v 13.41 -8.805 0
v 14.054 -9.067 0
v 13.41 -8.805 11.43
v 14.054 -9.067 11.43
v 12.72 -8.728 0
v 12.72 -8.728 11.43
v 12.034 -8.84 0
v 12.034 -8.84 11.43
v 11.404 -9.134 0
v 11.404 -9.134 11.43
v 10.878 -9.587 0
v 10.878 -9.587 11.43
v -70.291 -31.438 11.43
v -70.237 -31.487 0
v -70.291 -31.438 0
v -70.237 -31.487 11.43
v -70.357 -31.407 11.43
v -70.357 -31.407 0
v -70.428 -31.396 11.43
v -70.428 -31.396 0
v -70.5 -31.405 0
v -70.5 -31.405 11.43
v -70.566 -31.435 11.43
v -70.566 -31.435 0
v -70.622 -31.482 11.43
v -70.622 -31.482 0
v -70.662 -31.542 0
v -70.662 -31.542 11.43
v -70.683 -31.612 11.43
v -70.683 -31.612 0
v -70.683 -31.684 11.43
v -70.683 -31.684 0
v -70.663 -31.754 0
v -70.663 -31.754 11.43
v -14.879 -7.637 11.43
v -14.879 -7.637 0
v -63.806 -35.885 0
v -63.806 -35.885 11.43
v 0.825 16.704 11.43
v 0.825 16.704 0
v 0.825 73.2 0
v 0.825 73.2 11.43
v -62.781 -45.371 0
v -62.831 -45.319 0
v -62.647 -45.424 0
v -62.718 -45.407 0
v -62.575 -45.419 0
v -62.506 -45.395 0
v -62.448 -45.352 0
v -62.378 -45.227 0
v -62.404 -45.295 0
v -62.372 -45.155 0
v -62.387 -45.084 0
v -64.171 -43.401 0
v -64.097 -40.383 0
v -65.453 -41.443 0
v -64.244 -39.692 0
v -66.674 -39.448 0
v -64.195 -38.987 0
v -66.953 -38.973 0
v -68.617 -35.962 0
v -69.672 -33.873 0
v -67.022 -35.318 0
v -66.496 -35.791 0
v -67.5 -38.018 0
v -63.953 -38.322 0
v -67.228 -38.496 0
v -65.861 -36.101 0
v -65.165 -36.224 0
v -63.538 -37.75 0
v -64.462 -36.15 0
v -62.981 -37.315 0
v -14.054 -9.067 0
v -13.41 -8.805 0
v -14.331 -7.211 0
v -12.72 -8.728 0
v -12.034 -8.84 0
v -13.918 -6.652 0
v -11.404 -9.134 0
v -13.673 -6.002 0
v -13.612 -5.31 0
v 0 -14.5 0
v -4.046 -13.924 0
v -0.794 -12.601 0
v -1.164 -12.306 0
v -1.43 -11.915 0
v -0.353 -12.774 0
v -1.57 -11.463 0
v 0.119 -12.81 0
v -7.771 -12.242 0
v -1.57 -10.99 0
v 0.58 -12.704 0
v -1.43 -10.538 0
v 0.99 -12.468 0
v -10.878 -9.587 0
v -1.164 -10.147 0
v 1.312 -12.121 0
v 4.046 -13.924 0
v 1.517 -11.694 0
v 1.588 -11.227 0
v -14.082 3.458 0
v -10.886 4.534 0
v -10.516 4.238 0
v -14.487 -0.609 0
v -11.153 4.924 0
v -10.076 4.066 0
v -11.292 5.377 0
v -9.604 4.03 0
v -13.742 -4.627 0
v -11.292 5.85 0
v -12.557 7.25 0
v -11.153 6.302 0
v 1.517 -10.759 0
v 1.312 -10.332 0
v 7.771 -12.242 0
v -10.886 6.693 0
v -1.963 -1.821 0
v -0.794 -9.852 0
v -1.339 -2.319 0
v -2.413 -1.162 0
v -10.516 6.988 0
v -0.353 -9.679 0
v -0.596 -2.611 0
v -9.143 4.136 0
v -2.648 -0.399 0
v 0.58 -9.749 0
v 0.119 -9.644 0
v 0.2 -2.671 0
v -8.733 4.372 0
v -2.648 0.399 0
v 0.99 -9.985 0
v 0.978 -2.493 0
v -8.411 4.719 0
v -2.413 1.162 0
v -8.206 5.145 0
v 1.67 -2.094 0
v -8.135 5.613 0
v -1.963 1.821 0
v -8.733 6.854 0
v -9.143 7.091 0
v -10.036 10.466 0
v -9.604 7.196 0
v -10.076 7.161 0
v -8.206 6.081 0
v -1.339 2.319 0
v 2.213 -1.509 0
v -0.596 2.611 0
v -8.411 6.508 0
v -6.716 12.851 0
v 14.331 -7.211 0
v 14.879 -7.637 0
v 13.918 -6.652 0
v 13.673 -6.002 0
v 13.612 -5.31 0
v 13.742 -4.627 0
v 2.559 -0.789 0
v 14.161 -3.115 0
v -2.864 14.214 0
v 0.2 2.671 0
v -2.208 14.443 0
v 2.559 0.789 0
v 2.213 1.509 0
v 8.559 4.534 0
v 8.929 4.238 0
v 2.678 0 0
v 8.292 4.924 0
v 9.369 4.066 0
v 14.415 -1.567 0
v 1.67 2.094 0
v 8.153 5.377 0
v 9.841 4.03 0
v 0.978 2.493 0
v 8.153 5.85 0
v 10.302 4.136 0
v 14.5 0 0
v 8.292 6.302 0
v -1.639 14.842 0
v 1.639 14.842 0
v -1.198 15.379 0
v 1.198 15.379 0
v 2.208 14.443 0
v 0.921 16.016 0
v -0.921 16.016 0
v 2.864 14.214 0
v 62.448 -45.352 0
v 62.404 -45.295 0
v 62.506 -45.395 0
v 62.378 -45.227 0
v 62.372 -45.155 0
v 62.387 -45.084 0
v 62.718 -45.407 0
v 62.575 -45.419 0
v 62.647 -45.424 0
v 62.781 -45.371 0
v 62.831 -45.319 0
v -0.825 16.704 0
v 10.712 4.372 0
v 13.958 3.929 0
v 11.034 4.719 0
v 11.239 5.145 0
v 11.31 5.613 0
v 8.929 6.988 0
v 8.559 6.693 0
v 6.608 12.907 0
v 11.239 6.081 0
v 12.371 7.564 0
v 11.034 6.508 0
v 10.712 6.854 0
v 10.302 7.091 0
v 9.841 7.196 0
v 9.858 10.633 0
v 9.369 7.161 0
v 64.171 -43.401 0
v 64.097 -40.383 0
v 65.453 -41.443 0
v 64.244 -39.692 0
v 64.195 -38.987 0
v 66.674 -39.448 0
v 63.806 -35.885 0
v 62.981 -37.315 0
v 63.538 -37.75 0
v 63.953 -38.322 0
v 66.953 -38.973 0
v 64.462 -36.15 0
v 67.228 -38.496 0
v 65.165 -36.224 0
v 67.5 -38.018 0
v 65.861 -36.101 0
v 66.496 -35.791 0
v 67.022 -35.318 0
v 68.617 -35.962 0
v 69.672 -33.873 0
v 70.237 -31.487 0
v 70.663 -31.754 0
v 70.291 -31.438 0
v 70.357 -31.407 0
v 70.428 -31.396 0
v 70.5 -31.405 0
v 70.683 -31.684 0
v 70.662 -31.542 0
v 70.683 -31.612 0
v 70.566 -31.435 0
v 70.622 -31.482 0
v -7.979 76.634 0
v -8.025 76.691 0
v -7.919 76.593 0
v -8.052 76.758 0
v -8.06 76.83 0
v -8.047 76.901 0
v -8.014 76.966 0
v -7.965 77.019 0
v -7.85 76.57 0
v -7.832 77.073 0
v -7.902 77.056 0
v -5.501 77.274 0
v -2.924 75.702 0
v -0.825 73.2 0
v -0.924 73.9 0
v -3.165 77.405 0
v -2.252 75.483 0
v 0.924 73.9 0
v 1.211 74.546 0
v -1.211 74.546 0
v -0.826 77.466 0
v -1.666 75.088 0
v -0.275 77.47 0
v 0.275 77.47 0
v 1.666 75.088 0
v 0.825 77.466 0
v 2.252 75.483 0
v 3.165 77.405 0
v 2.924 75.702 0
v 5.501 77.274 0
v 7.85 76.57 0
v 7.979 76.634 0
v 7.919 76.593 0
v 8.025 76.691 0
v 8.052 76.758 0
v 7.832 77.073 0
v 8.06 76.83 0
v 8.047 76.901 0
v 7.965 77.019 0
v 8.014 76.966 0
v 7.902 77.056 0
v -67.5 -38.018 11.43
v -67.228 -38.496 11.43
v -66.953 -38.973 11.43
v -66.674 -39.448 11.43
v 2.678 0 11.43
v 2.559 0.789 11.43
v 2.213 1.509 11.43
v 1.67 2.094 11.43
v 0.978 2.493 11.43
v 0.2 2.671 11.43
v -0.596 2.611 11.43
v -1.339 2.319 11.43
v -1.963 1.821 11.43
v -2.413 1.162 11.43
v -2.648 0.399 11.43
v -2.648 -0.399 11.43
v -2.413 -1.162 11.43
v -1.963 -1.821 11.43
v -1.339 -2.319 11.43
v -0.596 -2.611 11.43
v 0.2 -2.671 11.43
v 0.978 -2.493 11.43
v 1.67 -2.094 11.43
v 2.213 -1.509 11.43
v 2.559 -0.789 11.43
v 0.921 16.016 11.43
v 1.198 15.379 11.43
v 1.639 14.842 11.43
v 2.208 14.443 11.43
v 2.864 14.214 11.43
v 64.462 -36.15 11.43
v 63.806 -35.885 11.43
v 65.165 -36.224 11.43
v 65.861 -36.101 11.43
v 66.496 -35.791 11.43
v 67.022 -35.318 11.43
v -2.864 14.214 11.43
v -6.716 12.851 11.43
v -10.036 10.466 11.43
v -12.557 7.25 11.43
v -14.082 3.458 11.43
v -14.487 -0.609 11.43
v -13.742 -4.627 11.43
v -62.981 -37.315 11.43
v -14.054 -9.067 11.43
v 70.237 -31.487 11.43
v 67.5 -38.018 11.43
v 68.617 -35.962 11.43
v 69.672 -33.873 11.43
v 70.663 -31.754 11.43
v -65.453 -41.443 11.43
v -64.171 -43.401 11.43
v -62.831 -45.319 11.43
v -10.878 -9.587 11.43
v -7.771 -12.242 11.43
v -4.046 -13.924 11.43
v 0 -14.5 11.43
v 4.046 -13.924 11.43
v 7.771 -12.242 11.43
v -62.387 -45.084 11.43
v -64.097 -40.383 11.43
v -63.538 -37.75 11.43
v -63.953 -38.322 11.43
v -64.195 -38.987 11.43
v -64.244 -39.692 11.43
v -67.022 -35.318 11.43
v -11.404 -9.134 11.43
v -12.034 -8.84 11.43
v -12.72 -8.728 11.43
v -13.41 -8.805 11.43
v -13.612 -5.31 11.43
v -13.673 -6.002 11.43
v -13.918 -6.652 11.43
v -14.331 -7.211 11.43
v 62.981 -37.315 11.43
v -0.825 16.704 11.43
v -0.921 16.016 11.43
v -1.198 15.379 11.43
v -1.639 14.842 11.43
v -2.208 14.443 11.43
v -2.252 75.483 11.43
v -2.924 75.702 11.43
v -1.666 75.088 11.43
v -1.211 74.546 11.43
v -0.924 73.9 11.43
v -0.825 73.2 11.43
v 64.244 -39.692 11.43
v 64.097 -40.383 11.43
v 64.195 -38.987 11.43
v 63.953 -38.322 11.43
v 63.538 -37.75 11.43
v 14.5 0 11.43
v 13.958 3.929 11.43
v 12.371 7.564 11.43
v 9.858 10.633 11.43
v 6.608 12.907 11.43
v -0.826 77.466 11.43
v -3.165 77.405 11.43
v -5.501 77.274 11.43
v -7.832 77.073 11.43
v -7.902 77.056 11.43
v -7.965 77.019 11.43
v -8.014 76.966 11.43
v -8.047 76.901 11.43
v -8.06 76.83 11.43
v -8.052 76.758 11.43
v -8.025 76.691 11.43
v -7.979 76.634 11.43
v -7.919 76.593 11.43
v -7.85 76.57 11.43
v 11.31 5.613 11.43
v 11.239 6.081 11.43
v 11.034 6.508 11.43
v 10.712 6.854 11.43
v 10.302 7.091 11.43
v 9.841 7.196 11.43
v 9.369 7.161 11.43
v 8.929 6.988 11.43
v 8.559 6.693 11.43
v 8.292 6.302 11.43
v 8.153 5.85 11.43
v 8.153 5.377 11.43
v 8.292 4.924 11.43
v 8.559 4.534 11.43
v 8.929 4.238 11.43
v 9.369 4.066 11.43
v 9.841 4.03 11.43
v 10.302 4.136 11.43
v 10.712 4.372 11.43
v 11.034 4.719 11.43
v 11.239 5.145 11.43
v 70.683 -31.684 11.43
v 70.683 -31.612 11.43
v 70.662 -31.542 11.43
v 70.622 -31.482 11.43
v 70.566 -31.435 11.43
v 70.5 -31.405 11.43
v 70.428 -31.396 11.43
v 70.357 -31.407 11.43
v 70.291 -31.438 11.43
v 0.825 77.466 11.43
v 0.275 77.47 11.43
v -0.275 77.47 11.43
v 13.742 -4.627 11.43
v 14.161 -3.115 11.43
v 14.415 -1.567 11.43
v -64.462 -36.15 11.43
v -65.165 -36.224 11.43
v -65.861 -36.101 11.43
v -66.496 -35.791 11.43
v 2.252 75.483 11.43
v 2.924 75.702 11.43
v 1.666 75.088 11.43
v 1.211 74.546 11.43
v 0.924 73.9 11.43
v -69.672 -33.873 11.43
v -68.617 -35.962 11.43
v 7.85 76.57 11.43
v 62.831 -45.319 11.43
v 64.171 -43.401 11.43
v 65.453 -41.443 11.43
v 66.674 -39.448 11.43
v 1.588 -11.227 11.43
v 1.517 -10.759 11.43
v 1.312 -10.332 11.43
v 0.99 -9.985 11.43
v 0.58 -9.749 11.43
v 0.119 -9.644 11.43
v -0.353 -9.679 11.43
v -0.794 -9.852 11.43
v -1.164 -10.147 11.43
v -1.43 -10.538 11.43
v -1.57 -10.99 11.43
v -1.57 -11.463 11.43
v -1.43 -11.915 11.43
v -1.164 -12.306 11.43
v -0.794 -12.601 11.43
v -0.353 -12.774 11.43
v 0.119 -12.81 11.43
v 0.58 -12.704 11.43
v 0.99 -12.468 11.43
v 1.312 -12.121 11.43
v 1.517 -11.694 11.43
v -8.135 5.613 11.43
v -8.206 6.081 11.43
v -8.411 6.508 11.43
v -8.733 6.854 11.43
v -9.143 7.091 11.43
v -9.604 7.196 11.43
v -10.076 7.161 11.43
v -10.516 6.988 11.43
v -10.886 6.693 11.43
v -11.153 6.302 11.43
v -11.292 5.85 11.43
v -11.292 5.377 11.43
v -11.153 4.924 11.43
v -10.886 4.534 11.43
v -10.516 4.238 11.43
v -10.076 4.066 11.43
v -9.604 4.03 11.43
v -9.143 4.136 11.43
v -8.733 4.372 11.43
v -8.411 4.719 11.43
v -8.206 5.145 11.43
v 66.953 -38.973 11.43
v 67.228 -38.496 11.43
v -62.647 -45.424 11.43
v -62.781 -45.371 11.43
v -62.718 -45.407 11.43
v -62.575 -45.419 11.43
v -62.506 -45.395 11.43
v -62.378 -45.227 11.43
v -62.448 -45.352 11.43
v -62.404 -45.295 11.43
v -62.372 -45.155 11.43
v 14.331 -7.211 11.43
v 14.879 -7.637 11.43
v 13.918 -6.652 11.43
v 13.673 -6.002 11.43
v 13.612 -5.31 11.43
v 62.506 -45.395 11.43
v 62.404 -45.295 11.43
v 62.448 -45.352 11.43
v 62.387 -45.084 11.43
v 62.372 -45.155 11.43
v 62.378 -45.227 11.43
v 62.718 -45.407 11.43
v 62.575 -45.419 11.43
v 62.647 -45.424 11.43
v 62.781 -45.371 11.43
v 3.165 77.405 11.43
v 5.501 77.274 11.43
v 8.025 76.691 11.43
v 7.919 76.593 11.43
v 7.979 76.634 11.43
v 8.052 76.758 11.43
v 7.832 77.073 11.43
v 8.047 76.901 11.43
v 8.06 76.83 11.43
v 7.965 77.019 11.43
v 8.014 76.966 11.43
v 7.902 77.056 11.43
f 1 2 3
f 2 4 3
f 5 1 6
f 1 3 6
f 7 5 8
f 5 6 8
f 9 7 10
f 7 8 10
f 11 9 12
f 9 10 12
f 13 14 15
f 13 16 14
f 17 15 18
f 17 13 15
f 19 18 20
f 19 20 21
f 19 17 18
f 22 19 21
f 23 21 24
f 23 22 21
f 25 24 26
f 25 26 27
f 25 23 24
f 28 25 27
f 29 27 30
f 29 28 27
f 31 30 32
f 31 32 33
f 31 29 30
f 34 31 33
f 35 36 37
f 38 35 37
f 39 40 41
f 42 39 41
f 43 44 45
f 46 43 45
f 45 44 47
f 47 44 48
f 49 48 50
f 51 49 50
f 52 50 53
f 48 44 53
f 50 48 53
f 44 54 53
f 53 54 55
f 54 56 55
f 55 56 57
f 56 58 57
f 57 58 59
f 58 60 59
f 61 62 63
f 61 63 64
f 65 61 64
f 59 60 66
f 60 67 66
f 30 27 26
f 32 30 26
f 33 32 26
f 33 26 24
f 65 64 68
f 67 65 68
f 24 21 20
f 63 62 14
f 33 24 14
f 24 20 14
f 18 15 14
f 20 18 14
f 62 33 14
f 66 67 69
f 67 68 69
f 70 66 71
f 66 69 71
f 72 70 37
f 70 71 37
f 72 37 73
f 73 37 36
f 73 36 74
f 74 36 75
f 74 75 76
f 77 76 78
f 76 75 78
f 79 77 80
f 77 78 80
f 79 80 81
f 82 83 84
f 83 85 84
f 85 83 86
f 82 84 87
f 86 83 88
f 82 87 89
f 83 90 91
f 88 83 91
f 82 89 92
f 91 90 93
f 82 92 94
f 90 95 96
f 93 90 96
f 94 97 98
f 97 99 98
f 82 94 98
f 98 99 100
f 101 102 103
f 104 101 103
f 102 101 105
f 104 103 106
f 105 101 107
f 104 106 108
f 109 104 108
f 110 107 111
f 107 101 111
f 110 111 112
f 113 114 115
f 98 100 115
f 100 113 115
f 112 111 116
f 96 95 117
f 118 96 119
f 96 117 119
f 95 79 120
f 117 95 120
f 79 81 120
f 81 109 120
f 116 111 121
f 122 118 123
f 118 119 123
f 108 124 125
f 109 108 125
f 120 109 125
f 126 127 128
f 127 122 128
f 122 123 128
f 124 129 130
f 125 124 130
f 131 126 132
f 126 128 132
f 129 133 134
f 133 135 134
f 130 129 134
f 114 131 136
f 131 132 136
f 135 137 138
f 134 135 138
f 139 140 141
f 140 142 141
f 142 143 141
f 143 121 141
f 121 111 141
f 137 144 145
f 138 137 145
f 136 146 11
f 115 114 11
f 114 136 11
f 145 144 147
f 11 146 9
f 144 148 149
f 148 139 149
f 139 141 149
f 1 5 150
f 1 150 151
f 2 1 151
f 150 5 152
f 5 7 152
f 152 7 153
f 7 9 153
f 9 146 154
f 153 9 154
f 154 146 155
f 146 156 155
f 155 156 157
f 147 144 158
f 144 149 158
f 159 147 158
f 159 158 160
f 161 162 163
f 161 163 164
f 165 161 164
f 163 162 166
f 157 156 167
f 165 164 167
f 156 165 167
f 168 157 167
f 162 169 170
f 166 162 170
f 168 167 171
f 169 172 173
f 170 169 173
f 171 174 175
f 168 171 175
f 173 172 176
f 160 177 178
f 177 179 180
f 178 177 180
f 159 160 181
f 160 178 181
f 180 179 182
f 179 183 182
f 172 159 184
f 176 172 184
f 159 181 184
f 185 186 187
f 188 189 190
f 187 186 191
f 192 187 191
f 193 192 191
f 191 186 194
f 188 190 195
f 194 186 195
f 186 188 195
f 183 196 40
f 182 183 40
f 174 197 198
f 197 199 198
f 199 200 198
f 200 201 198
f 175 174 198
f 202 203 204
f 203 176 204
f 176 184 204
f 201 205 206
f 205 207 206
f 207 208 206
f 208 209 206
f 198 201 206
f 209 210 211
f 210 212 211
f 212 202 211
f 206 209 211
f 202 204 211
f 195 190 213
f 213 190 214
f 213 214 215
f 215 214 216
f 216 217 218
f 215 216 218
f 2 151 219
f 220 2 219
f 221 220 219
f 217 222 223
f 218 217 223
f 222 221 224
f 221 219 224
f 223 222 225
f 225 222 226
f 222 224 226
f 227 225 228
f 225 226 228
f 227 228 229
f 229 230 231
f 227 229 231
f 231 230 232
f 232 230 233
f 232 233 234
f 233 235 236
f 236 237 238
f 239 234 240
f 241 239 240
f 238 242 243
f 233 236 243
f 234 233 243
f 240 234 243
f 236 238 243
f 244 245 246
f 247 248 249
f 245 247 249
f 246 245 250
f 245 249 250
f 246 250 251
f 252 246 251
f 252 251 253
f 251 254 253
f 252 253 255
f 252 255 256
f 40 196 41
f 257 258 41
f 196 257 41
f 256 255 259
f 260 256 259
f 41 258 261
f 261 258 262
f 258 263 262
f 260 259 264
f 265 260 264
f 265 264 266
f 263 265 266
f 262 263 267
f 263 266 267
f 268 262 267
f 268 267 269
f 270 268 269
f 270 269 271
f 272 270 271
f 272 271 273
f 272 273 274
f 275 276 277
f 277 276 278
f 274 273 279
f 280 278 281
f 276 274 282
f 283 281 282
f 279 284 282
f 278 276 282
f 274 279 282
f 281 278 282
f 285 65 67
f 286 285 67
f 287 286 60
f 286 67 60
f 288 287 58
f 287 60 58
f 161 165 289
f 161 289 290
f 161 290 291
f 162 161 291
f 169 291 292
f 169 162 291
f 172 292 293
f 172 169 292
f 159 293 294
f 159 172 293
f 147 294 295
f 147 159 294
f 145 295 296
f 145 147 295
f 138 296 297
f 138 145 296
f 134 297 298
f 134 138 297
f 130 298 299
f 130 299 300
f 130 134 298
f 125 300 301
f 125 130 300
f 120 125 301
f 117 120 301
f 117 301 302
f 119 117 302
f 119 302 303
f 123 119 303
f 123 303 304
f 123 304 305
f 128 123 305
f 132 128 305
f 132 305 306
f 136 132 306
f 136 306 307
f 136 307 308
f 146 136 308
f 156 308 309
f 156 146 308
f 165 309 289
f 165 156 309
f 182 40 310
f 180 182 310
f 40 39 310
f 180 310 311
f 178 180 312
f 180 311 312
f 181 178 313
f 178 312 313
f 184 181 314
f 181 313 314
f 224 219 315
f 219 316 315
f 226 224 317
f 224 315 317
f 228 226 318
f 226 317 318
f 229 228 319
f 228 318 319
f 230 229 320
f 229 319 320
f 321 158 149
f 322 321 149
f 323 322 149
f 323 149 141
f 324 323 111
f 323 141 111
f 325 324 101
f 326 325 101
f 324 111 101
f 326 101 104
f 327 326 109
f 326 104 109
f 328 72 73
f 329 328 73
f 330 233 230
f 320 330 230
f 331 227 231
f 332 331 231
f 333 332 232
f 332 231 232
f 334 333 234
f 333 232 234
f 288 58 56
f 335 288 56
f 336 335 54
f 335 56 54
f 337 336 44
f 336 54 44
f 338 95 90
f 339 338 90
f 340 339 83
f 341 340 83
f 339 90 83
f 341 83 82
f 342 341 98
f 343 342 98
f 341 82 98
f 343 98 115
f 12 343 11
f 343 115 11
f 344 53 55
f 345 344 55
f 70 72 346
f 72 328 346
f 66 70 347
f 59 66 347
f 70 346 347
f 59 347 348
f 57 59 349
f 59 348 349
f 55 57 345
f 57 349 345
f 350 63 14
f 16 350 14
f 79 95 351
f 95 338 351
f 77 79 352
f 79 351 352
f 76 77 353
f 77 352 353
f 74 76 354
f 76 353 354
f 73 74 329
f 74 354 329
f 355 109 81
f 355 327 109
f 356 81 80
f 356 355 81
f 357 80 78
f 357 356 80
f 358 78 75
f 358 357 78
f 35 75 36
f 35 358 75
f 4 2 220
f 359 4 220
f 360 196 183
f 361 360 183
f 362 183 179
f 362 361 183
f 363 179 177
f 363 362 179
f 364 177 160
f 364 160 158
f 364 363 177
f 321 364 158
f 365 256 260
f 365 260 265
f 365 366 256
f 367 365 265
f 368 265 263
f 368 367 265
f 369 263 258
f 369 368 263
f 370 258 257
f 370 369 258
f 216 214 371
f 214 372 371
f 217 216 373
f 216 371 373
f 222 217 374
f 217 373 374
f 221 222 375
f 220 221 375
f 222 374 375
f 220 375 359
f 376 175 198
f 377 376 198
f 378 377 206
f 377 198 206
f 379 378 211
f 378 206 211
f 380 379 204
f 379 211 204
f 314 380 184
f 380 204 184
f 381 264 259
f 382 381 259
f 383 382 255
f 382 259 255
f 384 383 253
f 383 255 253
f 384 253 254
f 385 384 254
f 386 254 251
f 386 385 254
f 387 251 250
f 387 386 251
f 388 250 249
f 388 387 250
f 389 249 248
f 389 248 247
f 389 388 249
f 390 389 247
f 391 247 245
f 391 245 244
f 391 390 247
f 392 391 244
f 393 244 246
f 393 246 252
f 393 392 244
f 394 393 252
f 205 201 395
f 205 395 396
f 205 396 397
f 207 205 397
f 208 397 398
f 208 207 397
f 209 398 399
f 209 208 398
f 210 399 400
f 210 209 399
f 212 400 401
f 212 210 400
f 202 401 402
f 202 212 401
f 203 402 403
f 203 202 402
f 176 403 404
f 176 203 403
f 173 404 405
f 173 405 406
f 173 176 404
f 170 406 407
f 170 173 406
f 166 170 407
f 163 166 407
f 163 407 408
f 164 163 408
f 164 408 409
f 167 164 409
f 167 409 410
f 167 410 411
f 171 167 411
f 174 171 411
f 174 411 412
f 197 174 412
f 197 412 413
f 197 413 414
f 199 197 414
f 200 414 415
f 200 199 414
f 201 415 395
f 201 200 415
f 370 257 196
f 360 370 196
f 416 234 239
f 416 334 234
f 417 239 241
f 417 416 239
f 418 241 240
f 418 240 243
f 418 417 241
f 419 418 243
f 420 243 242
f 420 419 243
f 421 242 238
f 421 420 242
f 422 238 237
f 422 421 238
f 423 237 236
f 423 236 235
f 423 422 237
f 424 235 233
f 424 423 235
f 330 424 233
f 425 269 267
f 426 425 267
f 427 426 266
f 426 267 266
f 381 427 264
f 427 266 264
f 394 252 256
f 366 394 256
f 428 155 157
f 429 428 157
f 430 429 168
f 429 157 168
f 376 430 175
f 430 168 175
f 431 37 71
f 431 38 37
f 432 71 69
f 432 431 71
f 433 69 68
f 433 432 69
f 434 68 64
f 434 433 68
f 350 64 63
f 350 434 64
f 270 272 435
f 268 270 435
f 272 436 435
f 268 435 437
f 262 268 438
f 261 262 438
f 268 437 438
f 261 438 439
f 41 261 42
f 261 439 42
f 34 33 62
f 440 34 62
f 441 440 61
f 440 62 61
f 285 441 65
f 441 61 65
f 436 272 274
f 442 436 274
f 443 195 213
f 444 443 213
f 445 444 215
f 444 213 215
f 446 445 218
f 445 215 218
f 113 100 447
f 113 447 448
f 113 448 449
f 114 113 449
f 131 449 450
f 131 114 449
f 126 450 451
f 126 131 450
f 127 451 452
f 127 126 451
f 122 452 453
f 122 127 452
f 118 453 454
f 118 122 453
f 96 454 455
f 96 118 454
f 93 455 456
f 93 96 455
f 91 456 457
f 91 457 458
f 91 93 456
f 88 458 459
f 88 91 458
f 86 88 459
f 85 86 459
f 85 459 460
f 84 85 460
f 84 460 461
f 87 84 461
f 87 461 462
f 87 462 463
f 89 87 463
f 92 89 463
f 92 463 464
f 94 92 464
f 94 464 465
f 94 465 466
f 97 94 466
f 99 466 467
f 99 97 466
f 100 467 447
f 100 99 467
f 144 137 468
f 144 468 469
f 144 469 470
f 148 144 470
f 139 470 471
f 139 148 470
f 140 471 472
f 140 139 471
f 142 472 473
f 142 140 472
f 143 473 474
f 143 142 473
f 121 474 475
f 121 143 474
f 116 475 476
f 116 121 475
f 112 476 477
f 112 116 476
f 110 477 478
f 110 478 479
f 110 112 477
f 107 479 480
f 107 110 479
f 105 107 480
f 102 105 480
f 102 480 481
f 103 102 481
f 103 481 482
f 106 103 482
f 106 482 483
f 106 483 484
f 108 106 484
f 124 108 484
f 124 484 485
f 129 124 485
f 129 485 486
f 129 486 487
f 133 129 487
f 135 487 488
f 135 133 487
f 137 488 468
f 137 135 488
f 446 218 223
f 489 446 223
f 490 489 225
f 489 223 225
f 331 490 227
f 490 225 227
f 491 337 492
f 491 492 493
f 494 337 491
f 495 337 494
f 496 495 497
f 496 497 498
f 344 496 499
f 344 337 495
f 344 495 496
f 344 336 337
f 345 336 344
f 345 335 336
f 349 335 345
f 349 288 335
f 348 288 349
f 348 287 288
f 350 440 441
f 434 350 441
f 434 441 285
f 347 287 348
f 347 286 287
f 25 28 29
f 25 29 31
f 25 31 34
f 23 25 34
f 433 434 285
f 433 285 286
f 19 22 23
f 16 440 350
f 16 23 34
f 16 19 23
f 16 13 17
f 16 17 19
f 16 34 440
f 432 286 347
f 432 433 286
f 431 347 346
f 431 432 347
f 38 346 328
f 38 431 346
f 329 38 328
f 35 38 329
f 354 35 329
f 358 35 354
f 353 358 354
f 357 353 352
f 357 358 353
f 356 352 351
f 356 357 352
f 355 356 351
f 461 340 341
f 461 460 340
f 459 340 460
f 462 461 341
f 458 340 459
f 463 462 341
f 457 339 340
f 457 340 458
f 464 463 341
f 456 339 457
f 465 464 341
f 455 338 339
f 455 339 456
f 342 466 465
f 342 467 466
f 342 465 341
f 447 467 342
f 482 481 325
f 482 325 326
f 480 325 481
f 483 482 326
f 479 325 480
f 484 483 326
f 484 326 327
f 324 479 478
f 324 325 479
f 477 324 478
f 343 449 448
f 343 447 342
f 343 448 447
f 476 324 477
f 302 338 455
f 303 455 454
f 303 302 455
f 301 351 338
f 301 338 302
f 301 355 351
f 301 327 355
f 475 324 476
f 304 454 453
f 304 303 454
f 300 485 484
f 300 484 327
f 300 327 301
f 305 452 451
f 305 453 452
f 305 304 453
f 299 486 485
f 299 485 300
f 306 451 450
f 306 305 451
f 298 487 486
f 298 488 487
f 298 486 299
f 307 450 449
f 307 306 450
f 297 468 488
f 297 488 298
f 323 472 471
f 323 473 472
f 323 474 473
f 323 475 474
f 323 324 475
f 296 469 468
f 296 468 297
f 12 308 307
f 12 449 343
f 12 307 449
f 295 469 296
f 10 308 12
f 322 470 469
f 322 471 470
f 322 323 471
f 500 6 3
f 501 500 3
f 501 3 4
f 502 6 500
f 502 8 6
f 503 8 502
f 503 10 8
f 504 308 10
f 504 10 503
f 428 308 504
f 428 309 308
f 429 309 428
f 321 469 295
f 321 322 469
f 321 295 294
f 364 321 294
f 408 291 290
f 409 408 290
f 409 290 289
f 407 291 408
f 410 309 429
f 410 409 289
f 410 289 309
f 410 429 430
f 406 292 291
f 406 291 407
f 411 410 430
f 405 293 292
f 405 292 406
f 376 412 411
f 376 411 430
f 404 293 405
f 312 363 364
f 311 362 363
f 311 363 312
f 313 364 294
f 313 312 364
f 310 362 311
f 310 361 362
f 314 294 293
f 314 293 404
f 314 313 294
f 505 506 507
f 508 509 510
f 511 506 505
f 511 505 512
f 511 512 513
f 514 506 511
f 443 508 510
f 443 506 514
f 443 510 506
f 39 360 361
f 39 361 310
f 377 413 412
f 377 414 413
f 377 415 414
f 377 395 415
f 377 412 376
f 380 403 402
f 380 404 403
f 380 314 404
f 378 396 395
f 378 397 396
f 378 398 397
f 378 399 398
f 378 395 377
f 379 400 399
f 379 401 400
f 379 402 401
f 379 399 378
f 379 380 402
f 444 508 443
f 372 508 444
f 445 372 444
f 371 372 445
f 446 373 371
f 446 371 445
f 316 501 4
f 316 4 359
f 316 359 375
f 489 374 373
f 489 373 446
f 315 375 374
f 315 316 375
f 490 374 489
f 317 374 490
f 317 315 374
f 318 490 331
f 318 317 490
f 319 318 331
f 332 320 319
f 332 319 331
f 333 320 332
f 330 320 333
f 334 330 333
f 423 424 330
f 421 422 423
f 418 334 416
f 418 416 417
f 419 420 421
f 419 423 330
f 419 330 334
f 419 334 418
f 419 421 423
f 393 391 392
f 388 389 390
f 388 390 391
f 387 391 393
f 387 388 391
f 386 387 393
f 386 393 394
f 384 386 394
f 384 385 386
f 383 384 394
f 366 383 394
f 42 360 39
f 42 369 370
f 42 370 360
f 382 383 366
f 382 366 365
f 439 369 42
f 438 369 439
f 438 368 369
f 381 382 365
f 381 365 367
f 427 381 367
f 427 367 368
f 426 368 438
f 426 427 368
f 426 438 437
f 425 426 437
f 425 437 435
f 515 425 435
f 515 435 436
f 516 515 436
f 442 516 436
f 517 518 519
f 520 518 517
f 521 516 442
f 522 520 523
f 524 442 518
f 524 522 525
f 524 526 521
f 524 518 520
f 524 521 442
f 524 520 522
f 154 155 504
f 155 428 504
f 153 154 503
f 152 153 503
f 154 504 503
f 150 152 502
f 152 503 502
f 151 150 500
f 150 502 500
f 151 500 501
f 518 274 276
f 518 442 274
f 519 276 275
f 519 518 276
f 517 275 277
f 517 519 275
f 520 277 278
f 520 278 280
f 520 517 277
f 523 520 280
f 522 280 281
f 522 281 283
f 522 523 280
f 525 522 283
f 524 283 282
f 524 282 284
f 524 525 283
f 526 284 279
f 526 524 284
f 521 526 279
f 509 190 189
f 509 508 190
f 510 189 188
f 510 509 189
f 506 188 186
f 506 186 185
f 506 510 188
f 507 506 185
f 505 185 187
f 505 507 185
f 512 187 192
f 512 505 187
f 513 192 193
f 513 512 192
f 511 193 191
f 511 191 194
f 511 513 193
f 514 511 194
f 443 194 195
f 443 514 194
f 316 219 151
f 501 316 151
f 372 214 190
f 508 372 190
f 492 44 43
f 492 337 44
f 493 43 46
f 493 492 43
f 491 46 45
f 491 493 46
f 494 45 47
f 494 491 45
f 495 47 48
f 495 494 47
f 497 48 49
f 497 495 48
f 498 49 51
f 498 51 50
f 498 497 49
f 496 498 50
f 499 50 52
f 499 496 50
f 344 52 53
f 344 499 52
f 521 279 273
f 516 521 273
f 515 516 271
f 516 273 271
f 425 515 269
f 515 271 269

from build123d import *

# Parameters (mm, degrees)
F0_R     = 1.5875
F0_R_2   = 2.677996
F1_DEPTH = 11.43
F2_R     = 0.254
F3_R     = 2.54


with BuildPart() as f1:
    # F0 (on Top) → F1 (new body)
    with BuildSketch(Plane.XY):
        with BuildLine():
            ThreePointArc((14.5, 0), (10.540867, 9.956913), (0.8255, 14.476483))
            ThreePointArc((0.8255, 14.476483), (0, 14.5), (-0.8255, 14.476483))
            ThreePointArc((-0.8255, 14.476483), (-12.557368, 7.25), (-12.949752, -6.523337))
            ThreePointArc((-12.949752, -6.523337), (-12.557368, -7.25), (-12.124252, -7.953145))
            ThreePointArc((-12.124252, -7.953145), (0, -14.5), (12.124252, -7.953145))
            ThreePointArc((12.124252, -7.953145), (12.557368, -7.25), (12.949752, -6.523337))
            ThreePointArc((12.949752, -6.523337), (14.107115, -3.352507), (14.5, 0))
        make_face()
        with Locations((0, -11.226573)):
            Circle(F0_R, mode=Mode.SUBTRACT)
        with Locations((-9.722497, 5.613286)):
            Circle(F0_R, mode=Mode.SUBTRACT)
        Circle(F0_R_2, mode=Mode.SUBTRACT)
        with Locations((9.722497, 5.613286)):
            Circle(F0_R, mode=Mode.SUBTRACT)
        with BuildLine():
            Line((0.8255, 75.331596), (0.8255, 77.465602))
            ThreePointArc((0.8255, 77.465602), (0, 77.47), (-0.8255, 77.465602))
            Line((-0.8255, 77.465602), (-0.8255, 75.331596))
            Line((-0.8255, 75.331596), (-0.8255, 14.476483))
            ThreePointArc((-0.8255, 14.476483), (0, 14.5), (0.8255, 14.476483))
            Line((0.8255, 14.476483), (0.8255, 75.331596))
        make_face()
        with BuildLine():
            ThreePointArc((-12.124252, -7.953145), (-12.557368, -7.25), (-12.949752, -6.523337))
            Line((-12.949752, -6.523337), (-65.651826, -36.950894))
            Line((-65.651826, -36.950894), (-67.499929, -38.017897))
            ThreePointArc((-67.499929, -38.017897), (-67.090988, -38.735), (-66.674429, -39.447705))
            Line((-66.674429, -39.447705), (-64.826326, -38.380702))
            Line((-64.826326, -38.380702), (-12.124252, -7.953145))
        make_face()
        with BuildLine():
            ThreePointArc((66.674429, -39.447705), (67.090988, -38.735), (67.499929, -38.017897))
            Line((67.499929, -38.017897), (65.651826, -36.950894))
            Line((65.651826, -36.950894), (12.949752, -6.523337))
            ThreePointArc((12.949752, -6.523337), (12.557368, -7.25), (12.124252, -7.953145))
            Line((12.124252, -7.953145), (64.826326, -38.380702))
            Line((64.826326, -38.380702), (66.674429, -39.447705))
        make_face()
        with BuildLine():
            Line((-0.8255, 75.331596), (-0.8255, 77.465602))
            ThreePointArc((-0.8255, 77.465602), (-5.211335, 77.29452), (-9.580441, 76.875328))
            Line((-9.580441, 76.875328), (-0.8255, 75.331596))
        make_face()
        with BuildLine():
            Line((0.8255, 75.331596), (9.580441, 76.875328))
            ThreePointArc((9.580441, 76.875328), (5.211335, 77.29452), (0.8255, 77.465602))
            Line((0.8255, 77.465602), (0.8255, 75.331596))
        make_face()
        with BuildLine():
            ThreePointArc((61.785766, -46.734569), (64.333351, -43.160408), (66.674429, -39.447705))
            Line((66.674429, -39.447705), (64.826326, -38.380702))
            Line((64.826326, -38.380702), (61.785766, -46.734569))
        make_face()
        with BuildLine():
            ThreePointArc((67.499929, -38.017897), (69.544686, -34.134112), (71.366207, -30.140759))
            Line((71.366207, -30.140759), (65.651826, -36.950894))
            Line((65.651826, -36.950894), (67.499929, -38.017897))
        make_face()
        with BuildLine():
            ThreePointArc((-66.674429, -39.447705), (-64.333351, -43.160408), (-61.785766, -46.734569))
            Line((-61.785766, -46.734569), (-64.826326, -38.380702))
            Line((-64.826326, -38.380702), (-66.674429, -39.447705))
        make_face()
        with BuildLine():
            Line((-65.651826, -36.950894), (-71.366207, -30.140759))
            ThreePointArc((-71.366207, -30.140759), (-69.544686, -34.134112), (-67.499929, -38.017897))
            Line((-67.499929, -38.017897), (-65.651826, -36.950894))
        make_face()
    extrude(amount=F1_DEPTH)

    # F2
    f2_edges = [f1.edges().sort_by_distance(p)[0] for p in [
        (71.366207, -30.140759, 5.715),
        (61.785766, -46.734569, 5.715),
        (-71.366207, -30.140759, 5.715),
        (-61.785766, -46.734569, 5.715),
        (-9.580441, 76.875328, 5.715),
        (9.580441, 76.875328, 5.715),
    ]]
    fillet(f2_edges, radius=F2_R)

    # F3
    f3_edges = [f1.edges().sort_by_distance(p)[0] for p in [
        (-12.124252, -7.953145, 5.715),
        (-12.949752, -6.523337, 5.715),
        (-0.8255, 14.476483, 5.715),
        (0.8255, 14.476483, 5.715),
        (12.949752, -6.523337, 5.715),
        (12.124252, -7.953145, 5.715),
        (-64.826326, -38.380702, 5.715),
        (-65.651826, -36.950894, 5.715),
        (-0.8255, 75.331596, 5.715),
        (64.826326, -38.380702, 5.715),
        (65.651826, -36.950894, 5.715),
        (0.8255, 75.331596, 5.715),
    ]]
    fillet(f3_edges, radius=F3_R)


solid = f1.part
